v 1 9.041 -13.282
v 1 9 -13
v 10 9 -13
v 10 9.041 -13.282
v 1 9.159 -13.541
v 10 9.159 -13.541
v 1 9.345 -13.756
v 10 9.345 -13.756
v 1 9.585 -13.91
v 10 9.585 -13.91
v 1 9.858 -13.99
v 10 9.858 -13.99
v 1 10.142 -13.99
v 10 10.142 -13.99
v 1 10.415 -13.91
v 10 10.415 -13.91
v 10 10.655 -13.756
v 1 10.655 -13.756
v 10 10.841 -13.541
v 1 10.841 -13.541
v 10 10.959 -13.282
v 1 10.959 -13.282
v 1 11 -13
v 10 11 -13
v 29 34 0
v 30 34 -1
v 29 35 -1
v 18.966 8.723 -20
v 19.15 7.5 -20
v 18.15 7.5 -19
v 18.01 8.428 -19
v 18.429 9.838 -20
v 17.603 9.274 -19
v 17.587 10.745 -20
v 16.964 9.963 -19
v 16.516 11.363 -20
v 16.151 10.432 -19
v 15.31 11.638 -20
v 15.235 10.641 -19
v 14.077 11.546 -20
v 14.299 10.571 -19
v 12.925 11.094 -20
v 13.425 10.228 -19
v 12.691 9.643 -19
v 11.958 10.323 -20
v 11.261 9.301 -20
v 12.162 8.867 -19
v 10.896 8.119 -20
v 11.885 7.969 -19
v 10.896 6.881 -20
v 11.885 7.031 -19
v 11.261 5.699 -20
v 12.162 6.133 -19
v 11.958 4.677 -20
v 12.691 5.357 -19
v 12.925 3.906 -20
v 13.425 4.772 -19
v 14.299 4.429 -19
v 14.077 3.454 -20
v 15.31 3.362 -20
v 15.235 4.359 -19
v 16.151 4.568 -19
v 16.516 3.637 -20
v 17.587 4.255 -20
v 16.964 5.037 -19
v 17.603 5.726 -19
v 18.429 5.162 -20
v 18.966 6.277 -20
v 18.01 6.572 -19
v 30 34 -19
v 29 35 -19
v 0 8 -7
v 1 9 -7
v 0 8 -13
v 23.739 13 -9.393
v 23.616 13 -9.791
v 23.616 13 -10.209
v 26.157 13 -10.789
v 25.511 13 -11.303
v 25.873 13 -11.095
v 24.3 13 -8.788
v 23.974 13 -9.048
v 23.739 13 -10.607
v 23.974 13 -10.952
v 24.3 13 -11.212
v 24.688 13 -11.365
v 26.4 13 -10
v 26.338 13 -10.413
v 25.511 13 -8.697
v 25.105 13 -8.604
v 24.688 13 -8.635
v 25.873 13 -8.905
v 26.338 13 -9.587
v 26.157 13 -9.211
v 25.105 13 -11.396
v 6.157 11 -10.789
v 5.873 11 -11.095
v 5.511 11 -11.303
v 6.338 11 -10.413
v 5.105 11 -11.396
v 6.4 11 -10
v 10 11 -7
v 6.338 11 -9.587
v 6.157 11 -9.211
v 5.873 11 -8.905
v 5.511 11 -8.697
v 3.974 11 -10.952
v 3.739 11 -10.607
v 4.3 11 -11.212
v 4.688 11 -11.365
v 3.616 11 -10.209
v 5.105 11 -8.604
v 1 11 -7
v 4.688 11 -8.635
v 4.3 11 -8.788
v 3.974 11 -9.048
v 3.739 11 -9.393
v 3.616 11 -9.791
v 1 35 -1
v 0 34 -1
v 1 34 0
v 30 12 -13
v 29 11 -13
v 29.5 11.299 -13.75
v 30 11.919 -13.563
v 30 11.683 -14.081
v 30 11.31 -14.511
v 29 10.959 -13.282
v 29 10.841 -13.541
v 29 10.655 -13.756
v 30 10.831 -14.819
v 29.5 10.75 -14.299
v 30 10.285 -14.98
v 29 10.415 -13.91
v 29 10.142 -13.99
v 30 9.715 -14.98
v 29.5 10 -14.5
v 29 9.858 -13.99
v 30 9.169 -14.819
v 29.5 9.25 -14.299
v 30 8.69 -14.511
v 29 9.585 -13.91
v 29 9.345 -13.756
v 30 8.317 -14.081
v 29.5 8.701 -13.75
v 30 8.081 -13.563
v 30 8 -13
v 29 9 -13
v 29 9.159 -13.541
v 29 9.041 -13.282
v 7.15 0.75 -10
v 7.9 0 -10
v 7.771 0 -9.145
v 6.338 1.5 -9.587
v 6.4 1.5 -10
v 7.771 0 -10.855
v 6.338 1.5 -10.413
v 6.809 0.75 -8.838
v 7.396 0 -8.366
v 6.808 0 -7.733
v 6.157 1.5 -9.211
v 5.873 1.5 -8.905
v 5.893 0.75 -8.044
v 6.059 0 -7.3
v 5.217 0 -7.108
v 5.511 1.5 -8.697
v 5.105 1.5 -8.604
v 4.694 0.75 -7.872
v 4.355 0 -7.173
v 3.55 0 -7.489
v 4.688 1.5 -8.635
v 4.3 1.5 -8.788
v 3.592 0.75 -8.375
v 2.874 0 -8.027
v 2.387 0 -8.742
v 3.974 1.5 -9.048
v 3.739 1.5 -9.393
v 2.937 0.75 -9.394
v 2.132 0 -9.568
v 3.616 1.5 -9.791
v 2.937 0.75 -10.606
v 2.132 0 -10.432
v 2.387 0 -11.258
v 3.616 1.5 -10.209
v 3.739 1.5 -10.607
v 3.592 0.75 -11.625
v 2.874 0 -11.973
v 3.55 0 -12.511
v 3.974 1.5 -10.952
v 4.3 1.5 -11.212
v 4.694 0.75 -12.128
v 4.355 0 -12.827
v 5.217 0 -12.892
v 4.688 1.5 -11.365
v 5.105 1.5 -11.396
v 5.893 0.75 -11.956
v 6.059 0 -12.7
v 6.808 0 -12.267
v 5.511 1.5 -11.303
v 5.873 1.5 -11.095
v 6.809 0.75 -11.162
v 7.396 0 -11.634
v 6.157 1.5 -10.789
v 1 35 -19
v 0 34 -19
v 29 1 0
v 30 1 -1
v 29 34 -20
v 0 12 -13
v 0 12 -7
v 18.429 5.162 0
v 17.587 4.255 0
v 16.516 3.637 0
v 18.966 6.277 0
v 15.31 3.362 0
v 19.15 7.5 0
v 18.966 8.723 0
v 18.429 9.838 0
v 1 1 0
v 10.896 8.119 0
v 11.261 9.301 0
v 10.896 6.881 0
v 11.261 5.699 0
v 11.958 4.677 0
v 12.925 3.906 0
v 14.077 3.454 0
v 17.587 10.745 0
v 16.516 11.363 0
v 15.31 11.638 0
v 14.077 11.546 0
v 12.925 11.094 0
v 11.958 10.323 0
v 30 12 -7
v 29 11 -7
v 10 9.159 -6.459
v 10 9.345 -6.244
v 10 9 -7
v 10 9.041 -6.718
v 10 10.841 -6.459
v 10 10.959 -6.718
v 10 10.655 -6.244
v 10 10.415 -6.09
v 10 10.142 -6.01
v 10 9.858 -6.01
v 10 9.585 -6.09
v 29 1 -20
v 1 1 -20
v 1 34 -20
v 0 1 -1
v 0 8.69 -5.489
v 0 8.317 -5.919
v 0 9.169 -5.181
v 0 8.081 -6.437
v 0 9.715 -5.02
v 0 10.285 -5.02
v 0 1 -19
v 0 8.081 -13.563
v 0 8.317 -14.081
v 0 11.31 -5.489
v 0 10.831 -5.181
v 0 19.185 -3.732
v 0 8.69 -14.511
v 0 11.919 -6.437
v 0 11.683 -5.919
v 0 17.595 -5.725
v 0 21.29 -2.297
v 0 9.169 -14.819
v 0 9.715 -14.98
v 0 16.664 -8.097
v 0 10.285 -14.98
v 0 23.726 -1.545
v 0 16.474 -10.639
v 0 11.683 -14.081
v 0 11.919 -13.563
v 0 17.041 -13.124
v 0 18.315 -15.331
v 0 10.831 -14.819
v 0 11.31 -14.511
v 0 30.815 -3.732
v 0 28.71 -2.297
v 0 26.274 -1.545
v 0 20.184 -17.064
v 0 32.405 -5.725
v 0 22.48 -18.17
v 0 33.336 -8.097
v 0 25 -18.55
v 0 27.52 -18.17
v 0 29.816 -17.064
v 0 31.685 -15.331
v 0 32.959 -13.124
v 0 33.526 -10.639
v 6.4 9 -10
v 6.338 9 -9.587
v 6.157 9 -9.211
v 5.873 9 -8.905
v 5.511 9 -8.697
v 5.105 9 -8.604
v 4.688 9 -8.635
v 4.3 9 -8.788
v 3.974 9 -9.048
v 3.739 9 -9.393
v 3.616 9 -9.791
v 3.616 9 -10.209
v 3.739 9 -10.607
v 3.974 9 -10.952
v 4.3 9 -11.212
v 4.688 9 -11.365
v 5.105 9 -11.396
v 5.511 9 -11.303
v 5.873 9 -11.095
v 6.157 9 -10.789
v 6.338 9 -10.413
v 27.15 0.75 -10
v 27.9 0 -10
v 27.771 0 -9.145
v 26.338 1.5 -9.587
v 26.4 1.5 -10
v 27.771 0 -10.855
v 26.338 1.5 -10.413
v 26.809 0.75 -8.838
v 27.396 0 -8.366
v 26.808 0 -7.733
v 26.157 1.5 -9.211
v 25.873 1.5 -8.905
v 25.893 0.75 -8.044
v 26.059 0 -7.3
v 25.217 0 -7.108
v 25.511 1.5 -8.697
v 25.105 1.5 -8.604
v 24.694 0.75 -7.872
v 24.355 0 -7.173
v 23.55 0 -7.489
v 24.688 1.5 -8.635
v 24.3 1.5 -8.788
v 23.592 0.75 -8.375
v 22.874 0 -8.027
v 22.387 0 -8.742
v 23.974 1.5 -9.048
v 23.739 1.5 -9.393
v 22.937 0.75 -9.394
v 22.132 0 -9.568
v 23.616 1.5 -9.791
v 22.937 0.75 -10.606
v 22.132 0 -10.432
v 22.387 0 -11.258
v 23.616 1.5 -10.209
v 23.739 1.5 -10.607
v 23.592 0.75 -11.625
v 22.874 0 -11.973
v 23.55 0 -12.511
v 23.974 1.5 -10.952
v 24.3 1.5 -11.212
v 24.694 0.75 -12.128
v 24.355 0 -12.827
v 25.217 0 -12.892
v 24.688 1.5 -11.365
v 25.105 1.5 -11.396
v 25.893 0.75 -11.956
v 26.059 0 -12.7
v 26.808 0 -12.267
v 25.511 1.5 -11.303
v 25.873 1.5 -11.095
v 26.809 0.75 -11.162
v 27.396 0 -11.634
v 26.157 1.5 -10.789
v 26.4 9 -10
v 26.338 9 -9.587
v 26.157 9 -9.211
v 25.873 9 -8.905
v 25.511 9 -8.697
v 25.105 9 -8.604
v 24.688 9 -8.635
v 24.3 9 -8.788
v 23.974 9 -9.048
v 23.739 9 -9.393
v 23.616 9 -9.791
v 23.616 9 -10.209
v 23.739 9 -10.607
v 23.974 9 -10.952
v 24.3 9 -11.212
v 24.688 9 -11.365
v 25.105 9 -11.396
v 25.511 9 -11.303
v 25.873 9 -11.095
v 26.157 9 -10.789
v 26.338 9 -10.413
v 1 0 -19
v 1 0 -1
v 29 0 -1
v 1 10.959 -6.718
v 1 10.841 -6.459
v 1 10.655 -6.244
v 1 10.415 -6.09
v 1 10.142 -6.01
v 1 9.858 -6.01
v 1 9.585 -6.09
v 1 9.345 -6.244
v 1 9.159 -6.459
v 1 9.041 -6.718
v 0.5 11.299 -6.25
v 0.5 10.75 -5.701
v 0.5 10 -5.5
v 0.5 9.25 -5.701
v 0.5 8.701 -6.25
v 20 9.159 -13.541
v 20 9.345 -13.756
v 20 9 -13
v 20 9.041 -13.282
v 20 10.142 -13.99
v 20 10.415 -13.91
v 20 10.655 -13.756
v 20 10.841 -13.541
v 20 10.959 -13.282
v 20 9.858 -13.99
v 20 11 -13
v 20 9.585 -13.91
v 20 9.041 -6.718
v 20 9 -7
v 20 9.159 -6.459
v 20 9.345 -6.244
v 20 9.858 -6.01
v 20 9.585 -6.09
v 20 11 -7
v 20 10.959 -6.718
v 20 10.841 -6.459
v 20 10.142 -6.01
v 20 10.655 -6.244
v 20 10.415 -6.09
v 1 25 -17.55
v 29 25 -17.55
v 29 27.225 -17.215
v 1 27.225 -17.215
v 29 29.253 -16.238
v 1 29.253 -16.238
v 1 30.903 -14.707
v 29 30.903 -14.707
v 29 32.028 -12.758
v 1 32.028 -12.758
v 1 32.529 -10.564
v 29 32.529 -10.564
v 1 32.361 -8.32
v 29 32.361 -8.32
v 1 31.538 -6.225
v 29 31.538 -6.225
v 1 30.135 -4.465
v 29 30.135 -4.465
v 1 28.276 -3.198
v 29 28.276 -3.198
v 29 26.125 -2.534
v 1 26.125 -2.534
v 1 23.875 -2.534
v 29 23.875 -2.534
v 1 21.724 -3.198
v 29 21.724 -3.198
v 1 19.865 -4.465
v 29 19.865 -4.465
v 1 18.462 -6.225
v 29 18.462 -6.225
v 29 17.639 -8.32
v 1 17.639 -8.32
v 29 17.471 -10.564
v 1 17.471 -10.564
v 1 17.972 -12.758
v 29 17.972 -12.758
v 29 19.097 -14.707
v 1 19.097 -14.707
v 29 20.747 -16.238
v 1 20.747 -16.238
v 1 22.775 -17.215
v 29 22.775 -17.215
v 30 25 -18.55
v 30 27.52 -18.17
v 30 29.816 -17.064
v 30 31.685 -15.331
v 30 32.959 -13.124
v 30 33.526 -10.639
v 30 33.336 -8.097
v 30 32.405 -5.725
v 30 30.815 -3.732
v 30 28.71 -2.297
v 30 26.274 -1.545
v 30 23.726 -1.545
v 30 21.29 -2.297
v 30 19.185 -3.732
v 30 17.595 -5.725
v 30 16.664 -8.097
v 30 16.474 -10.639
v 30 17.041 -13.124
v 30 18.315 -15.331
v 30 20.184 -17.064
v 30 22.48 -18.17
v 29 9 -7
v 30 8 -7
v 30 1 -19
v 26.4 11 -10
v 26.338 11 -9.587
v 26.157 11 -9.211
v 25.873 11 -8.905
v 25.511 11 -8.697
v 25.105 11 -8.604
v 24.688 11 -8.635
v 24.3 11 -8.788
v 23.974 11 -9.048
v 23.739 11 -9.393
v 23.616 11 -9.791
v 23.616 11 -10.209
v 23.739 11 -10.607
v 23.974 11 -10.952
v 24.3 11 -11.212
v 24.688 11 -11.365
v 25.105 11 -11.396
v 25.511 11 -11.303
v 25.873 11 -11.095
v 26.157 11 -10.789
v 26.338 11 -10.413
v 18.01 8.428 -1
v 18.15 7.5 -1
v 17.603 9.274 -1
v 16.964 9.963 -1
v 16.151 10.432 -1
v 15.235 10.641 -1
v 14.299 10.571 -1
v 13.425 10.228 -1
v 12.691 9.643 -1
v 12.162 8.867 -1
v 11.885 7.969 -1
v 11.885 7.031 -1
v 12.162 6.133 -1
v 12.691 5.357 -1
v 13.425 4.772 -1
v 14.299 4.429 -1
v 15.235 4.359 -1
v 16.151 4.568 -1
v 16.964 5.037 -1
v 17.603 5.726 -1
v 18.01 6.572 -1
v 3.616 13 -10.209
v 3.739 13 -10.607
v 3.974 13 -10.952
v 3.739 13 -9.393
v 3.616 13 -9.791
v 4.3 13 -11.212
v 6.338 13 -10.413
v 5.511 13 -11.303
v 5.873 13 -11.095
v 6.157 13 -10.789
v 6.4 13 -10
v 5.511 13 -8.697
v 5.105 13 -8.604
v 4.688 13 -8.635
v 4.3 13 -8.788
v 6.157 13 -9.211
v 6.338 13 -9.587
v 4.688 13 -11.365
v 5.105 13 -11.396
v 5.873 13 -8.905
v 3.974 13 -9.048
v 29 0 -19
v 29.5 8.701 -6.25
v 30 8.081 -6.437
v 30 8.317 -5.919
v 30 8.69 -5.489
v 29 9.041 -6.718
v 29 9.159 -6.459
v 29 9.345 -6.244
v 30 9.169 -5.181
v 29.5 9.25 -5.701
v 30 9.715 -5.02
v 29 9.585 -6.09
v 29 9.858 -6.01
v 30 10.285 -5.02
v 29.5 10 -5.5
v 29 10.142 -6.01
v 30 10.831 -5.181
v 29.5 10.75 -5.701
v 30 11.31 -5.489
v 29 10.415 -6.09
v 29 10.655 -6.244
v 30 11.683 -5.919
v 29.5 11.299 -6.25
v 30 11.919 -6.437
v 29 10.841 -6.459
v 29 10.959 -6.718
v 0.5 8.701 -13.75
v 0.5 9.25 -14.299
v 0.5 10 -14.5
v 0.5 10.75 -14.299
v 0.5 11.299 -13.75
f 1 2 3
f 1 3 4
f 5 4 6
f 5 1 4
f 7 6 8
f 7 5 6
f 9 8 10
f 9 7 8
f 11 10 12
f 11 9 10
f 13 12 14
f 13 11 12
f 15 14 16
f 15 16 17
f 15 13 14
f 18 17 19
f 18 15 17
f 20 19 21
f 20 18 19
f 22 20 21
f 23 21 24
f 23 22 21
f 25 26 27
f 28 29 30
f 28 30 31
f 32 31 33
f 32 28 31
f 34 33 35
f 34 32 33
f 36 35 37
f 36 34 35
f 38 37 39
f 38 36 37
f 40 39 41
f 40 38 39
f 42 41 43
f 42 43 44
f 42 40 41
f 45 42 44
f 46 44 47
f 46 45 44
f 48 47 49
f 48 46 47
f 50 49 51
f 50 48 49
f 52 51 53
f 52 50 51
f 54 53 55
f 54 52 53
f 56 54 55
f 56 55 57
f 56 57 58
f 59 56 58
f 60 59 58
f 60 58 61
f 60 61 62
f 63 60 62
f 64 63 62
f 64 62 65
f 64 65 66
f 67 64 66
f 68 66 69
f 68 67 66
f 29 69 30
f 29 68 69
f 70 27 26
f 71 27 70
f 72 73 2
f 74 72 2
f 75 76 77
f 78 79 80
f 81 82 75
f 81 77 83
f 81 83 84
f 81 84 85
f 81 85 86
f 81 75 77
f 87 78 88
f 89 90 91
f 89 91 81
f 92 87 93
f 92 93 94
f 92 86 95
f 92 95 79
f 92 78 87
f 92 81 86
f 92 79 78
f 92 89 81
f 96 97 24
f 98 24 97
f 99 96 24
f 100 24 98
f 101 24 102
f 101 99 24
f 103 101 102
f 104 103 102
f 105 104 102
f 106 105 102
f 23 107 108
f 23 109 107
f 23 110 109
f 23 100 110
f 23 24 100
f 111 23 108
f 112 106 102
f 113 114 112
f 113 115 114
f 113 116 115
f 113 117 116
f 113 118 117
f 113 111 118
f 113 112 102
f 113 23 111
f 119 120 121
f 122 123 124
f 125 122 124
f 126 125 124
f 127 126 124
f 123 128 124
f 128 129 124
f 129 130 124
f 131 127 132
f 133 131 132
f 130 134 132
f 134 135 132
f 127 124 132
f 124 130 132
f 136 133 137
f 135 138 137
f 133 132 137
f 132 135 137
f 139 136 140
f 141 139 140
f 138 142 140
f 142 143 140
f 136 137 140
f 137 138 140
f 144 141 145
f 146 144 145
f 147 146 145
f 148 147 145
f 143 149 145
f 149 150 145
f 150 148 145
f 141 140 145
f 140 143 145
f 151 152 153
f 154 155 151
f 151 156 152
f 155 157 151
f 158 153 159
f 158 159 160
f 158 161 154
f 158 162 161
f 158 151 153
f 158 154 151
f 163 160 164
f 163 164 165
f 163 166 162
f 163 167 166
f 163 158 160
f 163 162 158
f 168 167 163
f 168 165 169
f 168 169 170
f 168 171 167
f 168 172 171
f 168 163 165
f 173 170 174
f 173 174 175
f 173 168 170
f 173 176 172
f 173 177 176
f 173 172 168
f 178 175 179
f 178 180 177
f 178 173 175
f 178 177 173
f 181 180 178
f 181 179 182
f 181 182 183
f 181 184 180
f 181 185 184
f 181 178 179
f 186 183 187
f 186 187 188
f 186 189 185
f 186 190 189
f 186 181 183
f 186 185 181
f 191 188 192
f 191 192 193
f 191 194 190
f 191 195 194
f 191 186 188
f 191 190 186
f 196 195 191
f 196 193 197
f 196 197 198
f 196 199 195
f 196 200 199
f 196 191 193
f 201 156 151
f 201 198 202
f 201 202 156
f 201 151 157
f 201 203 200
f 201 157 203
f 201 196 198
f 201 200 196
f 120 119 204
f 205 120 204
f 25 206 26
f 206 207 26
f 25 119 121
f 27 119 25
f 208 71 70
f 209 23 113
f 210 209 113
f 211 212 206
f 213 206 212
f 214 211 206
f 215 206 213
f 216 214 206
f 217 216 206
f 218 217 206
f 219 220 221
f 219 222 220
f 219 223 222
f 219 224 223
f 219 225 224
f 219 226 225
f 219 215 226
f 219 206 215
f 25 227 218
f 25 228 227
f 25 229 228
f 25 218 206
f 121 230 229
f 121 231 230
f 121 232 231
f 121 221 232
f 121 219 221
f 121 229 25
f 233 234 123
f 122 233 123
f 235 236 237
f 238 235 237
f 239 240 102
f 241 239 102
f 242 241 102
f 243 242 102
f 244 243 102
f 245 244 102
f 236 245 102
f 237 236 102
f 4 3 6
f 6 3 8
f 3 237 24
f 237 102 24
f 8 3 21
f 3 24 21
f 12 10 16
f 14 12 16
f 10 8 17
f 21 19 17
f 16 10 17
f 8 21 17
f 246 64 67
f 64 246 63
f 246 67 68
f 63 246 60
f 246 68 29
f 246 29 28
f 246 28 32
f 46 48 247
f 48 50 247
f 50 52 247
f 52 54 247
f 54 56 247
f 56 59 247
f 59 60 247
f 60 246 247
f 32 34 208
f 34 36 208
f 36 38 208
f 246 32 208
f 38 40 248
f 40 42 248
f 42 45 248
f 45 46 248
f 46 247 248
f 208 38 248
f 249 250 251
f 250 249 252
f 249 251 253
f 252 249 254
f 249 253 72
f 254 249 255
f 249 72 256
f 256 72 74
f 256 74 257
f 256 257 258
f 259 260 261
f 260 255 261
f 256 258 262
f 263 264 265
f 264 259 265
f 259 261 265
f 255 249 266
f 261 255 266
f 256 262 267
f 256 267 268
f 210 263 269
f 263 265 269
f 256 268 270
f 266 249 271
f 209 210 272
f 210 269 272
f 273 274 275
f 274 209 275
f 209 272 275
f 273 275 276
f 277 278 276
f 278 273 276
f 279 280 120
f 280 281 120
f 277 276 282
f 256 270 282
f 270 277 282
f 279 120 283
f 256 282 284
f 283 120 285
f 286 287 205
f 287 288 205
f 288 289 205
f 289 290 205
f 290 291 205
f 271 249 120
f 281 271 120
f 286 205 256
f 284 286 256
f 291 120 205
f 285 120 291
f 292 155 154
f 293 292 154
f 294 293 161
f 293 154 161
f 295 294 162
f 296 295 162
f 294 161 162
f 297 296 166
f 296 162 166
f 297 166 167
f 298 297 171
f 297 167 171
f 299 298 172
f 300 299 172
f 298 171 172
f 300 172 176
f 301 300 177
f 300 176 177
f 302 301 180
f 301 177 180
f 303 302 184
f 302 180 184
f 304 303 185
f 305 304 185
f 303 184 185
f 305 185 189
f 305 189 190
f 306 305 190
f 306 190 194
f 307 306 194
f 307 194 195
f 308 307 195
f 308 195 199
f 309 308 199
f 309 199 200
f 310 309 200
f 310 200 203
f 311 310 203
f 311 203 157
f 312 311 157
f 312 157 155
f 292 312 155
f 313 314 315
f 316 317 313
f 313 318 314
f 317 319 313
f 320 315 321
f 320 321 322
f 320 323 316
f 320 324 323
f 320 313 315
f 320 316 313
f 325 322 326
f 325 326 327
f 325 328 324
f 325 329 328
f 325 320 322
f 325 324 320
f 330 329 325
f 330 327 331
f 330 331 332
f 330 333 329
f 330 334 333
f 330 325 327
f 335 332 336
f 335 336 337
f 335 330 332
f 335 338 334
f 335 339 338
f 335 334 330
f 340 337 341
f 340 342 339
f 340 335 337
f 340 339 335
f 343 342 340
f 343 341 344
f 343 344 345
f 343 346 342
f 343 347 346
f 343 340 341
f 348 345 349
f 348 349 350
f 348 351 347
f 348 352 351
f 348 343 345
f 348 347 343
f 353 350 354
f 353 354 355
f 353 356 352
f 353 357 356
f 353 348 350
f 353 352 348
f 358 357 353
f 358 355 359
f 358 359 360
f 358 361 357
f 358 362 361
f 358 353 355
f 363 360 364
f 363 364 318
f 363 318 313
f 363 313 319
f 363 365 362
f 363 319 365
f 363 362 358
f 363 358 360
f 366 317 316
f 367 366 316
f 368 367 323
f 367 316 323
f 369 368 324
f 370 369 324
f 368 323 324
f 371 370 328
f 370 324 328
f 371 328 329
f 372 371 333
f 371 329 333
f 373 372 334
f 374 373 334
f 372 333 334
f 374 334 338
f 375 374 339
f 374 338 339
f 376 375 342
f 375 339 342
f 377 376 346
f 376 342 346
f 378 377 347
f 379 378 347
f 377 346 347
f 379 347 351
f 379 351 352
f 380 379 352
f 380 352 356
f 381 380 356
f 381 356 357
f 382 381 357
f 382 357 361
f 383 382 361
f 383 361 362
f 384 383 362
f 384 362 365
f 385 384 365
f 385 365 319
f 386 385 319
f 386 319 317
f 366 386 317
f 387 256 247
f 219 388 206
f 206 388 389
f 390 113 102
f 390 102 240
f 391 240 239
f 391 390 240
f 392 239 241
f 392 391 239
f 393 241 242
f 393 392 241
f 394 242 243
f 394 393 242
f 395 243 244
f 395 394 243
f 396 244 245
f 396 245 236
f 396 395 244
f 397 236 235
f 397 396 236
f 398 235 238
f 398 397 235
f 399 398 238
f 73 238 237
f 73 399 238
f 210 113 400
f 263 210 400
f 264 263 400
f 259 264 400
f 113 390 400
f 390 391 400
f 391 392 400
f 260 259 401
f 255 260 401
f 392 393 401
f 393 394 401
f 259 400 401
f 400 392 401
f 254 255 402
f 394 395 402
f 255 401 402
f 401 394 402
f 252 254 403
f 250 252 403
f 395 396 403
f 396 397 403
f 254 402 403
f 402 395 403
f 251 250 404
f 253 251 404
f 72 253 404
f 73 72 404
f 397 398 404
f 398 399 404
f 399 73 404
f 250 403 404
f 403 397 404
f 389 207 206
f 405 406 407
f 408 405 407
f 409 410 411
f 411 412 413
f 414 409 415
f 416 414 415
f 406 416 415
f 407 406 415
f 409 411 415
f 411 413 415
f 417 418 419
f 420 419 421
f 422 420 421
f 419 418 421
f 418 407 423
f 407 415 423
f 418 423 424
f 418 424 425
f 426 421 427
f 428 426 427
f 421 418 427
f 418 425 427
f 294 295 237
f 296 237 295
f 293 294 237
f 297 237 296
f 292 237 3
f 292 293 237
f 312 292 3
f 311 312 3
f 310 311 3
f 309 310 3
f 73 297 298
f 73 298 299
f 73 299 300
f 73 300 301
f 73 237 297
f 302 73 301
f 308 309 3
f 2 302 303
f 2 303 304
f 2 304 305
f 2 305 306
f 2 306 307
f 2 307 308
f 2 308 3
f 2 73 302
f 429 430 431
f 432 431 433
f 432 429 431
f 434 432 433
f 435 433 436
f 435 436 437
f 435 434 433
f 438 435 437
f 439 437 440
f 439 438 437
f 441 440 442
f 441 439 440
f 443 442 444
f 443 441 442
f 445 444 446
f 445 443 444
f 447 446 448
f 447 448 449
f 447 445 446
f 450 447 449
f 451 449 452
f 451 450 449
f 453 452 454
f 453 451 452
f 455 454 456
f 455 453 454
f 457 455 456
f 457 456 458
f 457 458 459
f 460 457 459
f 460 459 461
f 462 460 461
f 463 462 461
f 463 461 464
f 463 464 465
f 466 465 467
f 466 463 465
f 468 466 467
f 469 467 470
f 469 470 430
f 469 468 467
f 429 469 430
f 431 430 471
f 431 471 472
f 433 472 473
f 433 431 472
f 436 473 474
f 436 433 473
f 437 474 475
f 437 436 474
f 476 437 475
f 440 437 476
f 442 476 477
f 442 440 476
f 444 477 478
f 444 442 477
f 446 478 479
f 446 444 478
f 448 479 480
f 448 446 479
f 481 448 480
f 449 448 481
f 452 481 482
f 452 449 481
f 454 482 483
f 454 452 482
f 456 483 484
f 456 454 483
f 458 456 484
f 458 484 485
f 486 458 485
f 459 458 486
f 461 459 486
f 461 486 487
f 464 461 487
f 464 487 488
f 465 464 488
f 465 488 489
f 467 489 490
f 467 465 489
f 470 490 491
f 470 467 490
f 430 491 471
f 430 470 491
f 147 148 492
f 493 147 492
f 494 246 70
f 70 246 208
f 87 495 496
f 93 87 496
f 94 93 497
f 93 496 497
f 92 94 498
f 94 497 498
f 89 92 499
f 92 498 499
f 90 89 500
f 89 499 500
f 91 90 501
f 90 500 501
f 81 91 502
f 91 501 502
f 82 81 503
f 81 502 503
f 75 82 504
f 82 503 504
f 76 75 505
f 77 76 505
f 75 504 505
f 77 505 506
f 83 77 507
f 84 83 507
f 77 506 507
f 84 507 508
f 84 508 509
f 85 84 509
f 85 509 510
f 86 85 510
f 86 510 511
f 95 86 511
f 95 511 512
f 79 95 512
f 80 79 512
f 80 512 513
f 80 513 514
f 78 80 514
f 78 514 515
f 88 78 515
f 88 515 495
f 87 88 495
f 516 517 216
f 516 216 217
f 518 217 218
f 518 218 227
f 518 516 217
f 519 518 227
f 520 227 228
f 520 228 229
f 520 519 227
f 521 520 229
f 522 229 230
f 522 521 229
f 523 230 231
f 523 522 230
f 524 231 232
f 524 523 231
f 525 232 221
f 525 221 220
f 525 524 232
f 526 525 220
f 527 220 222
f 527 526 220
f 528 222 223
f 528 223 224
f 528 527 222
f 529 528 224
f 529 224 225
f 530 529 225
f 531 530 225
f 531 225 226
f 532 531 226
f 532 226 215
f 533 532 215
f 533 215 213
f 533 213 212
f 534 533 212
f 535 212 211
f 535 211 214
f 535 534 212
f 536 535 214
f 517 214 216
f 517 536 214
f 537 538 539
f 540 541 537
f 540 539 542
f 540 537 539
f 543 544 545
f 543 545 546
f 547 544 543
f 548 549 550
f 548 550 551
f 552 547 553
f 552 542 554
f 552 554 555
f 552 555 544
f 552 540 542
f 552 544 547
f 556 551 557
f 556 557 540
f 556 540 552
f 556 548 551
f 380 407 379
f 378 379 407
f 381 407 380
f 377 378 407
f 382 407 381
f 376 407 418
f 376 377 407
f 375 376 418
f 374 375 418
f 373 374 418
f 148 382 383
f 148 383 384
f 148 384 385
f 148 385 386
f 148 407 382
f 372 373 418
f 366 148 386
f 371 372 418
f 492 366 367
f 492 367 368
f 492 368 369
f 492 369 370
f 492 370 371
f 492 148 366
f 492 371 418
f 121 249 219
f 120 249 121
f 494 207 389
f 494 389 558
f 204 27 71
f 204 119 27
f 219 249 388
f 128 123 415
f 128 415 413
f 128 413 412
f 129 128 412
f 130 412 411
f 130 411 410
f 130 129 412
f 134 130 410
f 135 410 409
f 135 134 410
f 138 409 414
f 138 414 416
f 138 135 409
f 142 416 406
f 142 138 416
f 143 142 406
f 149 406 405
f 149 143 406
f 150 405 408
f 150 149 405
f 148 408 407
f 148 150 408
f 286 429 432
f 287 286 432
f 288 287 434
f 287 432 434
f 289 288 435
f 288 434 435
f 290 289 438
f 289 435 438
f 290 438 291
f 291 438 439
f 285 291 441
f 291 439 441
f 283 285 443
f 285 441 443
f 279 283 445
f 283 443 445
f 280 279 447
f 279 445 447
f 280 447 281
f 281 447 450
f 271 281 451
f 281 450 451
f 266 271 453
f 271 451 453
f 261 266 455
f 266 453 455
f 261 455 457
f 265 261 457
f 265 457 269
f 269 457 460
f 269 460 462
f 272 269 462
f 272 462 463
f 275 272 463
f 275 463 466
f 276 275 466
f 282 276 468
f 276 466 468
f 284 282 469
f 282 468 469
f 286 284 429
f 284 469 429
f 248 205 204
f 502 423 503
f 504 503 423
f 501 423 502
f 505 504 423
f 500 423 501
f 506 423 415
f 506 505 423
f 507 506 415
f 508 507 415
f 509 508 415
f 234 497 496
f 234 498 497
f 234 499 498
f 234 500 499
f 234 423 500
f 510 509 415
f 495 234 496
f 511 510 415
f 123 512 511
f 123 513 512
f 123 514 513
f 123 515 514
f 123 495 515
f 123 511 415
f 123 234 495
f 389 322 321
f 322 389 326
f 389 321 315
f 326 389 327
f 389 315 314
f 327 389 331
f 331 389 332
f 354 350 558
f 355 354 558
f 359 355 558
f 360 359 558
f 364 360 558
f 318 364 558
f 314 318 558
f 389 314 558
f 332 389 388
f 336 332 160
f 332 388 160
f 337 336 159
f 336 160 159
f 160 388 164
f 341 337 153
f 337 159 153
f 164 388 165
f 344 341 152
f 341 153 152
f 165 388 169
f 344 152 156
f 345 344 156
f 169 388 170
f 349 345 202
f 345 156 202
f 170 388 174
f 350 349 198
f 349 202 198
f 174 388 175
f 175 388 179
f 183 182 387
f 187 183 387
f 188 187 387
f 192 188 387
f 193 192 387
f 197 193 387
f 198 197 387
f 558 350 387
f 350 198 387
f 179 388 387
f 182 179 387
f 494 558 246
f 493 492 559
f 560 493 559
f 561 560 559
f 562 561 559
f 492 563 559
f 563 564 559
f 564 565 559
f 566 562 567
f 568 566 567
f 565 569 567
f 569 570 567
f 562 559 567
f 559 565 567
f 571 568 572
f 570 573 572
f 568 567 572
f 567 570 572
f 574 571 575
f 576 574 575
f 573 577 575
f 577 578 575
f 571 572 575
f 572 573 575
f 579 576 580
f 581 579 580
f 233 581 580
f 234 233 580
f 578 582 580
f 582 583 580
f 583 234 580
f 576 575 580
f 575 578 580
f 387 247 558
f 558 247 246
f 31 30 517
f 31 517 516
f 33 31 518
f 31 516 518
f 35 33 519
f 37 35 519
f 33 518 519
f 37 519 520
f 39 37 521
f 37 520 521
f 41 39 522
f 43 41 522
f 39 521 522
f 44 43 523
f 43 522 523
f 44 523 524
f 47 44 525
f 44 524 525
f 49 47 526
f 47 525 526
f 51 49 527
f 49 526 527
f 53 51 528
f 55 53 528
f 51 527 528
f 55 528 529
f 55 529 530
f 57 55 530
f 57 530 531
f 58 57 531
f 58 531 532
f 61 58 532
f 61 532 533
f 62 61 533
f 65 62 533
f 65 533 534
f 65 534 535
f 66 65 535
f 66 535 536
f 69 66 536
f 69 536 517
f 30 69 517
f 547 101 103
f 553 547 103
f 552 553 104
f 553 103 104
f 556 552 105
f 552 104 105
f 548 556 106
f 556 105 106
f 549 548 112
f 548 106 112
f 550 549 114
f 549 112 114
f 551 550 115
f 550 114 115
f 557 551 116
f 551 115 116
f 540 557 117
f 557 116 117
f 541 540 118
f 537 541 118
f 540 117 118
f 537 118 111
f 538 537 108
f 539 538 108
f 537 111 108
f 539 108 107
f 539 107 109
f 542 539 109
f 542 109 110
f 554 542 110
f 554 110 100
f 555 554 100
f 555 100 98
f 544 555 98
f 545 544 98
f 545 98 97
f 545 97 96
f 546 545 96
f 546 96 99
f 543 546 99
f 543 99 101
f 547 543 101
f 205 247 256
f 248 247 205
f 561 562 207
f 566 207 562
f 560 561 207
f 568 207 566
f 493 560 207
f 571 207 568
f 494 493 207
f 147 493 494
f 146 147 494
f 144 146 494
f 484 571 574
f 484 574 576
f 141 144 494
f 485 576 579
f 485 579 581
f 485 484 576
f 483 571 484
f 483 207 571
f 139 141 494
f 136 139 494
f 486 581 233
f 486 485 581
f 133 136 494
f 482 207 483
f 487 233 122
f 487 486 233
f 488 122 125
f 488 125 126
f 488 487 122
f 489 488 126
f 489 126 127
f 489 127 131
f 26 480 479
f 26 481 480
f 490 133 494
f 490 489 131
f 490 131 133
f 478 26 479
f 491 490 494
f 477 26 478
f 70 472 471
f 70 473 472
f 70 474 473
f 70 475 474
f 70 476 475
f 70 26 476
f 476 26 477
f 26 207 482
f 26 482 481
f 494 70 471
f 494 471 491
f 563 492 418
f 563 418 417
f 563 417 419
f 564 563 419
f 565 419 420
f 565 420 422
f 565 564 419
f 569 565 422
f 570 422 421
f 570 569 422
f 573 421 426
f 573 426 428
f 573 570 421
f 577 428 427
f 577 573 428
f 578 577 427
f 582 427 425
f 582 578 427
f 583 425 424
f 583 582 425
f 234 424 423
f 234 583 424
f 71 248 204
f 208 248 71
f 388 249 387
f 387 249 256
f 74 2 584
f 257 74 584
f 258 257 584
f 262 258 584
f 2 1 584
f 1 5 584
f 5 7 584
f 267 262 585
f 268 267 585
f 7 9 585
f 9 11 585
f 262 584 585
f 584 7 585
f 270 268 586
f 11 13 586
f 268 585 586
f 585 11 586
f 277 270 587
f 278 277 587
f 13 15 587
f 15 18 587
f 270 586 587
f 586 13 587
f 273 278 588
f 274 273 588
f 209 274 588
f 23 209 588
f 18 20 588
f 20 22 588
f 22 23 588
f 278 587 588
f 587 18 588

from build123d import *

# Parameters (mm, degrees)
SKETCH_1_W          = 20
SKETCH_1_H          = 35
SKETCH_1_R          = 7.55
EXTRUDE_1_DEPTH     = 30
CUT_EXTRUDE_1_REACH = 22
SKETCH_2_R          = 3.15
CUT_EXTRUDE_2_DEPTH = 10
CUT_EXTRUDE_3_DEPTH = 10
SKETCH_5_R          = 1.4
CUT_EXTRUDE_4_DEPTH = 13
CHAMFER_1_SIZE      = 1
CHAMFER_2_SIZE      = 1.5


with BuildPart() as part:
    # 草图1 → 凸台-拉伸1 (new body)
    with BuildSketch(Plane(origin=(0, 0, 0), x_dir=(0, 0, -1), z_dir=(1, 0, 0))):
        with Locations((10, 17.5)):
            Rectangle(SKETCH_1_W, SKETCH_1_H)
        with Locations((10, 25)):
            Circle(SKETCH_1_R, mode=Mode.SUBTRACT)
    extrude(amount=EXTRUDE_1_DEPTH)

    # 草图2 → 切除-拉伸1 (cut, up to next)
    with BuildSketch(Plane.XY, mode=Mode.PRIVATE) as cut_extrude_1_sk1:
        with Locations((15, 7.5)):
            Circle(SKETCH_2_R)
    cut_extrude_1_tool1 = extrude(cut_extrude_1_sk1.sketch, amount=-CUT_EXTRUDE_1_REACH, mode=Mode.PRIVATE) & part.part
    add(cut_extrude_1_tool1.solids().sort_by_distance((15, 7.5, 0))[0], mode=Mode.SUBTRACT)

    # 草图3 → 切除-拉伸2 (cut)
    with BuildSketch(Plane(origin=(30, 0, 0), x_dir=(0, 0, -1), z_dir=(1, 0, 0))):
        with BuildLine():
            Line((7, 11), (13, 11))
            ThreePointArc((13, 11), (14, 10), (13, 9))
            Line((13, 9), (7, 9))
            ThreePointArc((7, 9), (6, 10), (7, 11))
        make_face()
    extrude(amount=-CUT_EXTRUDE_2_DEPTH, mode=Mode.SUBTRACT)

    # 草图4 → 切除-拉伸3 (cut)
    with BuildSketch(Plane.ZY):
        with BuildLine():
            Line((-7, 9), (-13, 9))
            ThreePointArc((-13, 9), (-14, 10), (-13, 11))
            Line((-13, 11), (-7, 11))
            ThreePointArc((-7, 11), (-6, 10), (-7, 9))
        make_face()
    extrude(amount=-CUT_EXTRUDE_3_DEPTH, mode=Mode.SUBTRACT)

    # 草图5 → 切除-拉伸4 (cut)
    with BuildSketch(Plane.XZ):
        with Locations((5, -10)):
            Circle(SKETCH_5_R)
        with Locations((25, -10)):
            Circle(SKETCH_5_R)
    extrude(amount=-CUT_EXTRUDE_4_DEPTH, mode=Mode.SUBTRACT)

    # 倒角1
    chamfer_1_edges = [part.edges().sort_by_distance(p)[0] for p in [
        (0, 25, -2.45),
        (30, 25, -2.45),
        (30, 35, -10),
        (30, 17.5, 0),
        (11.85, 7.5, 0),
        (11.85, 7.5, -20),
        (30, 10, -6),
        (30, 9, -10),
        (30, 10, -14),
        (30, 11, -10),
        (0, 10, -6),
        (0, 11, -10),
        (0, 10, -14),
        (0, 9, -10),
        (30, 0, -10),
        (0, 17.5, 0),
        (0, 35, -10),
        (0, 17.5, -20),
        (0, 0, -10),
        (15, 0, 0),
        (15, 35, 0),
        (15, 35, -20),
        (15, 0, -20),
        (30, 17.5, -20),
    ]]
    chamfer(chamfer_1_edges, length=CHAMFER_1_SIZE)

    # 倒角2
    chamfer_2_edges = [part.edges().sort_by_distance(p)[0] for p in [
        (3.6, 0, -10),
        (23.6, 0, -10),
    ]]
    chamfer(chamfer_2_edges, length=CHAMFER_2_SIZE)


solid = part.part
